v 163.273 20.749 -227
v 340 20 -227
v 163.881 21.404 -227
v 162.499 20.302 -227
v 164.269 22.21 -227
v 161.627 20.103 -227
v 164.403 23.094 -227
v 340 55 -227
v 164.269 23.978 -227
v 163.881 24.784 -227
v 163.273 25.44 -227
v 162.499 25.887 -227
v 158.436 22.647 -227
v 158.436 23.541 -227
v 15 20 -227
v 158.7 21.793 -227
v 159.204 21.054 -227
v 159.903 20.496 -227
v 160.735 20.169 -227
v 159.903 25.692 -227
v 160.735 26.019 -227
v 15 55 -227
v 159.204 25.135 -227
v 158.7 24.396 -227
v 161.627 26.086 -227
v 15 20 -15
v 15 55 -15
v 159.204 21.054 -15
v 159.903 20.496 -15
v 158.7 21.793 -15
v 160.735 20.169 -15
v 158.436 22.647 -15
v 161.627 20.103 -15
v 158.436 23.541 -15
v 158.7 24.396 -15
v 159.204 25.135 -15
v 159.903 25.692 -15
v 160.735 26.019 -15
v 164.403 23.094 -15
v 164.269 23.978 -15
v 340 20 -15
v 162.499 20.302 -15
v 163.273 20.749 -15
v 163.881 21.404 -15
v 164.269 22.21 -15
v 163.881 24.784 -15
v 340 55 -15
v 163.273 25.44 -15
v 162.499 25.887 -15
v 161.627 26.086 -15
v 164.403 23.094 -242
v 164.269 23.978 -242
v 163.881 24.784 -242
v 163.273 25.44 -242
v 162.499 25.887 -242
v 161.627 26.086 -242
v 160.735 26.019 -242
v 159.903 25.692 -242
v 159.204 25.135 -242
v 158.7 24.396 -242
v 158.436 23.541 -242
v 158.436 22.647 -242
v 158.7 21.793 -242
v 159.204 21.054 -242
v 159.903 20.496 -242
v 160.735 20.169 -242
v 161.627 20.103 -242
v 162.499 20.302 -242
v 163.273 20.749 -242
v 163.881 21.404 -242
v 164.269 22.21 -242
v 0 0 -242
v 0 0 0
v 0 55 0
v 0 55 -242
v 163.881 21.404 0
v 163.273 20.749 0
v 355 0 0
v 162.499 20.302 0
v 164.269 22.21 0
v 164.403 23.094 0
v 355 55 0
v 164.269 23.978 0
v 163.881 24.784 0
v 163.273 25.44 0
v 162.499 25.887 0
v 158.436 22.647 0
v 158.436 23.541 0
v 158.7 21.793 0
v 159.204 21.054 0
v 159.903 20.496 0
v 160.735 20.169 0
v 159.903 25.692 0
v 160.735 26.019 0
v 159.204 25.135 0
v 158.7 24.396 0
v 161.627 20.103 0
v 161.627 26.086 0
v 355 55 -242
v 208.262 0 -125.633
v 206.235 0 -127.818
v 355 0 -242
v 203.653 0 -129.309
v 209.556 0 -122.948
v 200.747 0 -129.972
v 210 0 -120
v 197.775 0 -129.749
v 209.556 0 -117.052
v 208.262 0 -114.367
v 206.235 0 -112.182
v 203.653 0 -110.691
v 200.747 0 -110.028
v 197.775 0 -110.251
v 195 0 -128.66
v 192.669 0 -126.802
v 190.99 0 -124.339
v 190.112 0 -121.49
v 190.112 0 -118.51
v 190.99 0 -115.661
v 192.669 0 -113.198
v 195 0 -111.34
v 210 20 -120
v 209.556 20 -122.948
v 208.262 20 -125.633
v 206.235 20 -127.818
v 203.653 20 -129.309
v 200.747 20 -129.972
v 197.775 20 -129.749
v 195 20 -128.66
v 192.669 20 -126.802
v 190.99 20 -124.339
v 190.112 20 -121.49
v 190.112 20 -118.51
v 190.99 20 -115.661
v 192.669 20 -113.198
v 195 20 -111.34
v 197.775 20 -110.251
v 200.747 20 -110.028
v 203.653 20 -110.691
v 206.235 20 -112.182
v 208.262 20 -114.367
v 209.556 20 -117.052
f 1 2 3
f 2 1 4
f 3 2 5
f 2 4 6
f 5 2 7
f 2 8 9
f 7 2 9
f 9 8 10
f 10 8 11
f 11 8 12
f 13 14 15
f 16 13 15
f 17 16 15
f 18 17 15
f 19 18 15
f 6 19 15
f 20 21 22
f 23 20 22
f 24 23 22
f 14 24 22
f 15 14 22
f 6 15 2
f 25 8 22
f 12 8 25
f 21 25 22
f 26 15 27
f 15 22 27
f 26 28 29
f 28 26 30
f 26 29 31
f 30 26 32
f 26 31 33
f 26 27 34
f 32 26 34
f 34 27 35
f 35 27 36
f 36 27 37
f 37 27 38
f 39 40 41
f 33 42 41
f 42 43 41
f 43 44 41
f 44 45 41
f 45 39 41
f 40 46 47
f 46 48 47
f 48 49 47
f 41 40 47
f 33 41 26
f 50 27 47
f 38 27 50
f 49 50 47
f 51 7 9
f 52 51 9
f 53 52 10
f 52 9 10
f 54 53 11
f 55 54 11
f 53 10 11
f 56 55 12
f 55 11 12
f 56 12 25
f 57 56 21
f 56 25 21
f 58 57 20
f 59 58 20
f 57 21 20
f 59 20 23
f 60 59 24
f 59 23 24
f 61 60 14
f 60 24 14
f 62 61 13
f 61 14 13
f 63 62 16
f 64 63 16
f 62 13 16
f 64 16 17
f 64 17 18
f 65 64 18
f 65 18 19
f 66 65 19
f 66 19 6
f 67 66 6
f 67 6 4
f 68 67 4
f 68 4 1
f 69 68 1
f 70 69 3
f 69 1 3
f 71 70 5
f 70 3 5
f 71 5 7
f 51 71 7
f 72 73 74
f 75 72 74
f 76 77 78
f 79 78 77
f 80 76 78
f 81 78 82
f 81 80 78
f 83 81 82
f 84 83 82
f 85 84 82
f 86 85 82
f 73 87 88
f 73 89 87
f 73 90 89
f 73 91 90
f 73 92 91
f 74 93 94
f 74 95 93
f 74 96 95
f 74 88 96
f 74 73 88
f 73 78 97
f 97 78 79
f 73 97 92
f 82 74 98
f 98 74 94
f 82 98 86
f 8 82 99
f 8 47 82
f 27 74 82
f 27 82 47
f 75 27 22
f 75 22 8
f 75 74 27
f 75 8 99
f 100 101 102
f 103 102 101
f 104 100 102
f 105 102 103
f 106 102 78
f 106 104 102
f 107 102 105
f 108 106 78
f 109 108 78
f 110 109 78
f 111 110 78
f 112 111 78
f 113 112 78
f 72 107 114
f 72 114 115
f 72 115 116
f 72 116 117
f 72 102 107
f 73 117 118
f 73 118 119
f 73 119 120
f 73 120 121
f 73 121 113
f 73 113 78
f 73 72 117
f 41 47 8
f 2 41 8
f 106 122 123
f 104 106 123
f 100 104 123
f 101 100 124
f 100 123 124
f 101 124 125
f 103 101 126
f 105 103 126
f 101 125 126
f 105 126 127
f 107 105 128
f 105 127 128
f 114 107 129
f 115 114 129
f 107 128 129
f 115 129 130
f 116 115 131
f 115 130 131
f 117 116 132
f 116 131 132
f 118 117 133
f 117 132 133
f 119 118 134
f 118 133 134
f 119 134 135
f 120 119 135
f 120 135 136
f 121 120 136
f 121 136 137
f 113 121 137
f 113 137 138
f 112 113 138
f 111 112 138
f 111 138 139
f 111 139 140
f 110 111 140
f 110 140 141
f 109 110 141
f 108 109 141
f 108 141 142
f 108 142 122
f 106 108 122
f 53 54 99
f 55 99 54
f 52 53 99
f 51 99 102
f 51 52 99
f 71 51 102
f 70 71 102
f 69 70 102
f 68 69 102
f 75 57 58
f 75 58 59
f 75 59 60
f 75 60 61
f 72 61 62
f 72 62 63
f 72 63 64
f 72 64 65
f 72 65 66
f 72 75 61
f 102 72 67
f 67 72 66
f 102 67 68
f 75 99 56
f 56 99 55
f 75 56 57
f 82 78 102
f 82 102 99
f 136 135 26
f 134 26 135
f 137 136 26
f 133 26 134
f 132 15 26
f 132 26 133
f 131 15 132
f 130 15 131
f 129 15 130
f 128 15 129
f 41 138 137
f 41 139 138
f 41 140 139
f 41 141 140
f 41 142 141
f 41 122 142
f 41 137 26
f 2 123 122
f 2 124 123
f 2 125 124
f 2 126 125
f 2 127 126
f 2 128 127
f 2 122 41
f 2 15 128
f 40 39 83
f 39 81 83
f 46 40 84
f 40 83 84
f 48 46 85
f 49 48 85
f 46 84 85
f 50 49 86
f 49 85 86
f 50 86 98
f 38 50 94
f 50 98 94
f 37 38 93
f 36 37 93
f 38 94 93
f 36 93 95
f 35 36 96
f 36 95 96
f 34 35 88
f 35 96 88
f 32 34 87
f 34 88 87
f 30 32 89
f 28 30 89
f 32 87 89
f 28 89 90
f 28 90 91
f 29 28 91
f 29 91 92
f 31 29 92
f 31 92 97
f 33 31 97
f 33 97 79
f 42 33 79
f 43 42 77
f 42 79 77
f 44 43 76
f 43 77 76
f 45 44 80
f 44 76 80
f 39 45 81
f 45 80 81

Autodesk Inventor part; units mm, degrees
ref_plane "YZ Plane" through (0, 0, 0) normal (1, 0, 0) x (0, 1, 0)
ref_plane "XZ Plane" through (0, 0, 0) normal (0, 1, 0) x (-1, 0, 0)
ref_plane "XY Plane" through (0, 0, 0) normal (0, 0, 1) x (1, 0, 0)
sketch "Sketch1" plane through (0, 0, 0) normal (1, 0, 0) x (0, 1, 0)
  line L0 (0, 0) -> (55, 0)
  line L1 (55, 0) -> (55, -242)
  line L2 (55, -242) -> (0, -242)
  line L3 (0, -242) -> (0, 0)
  dimension "d0" = 55
  dimension "d1" = 242
extrude "Extrusion1" add sketch "Sketch1" along normal blind 355
sketch "Sketch3" plane through (0, 55, 0) normal (0, 1, 0) x (1, 0, 0)
  circle A0 centre (200, 120) radius 10
  point P0 (0, 0)
  point P1 (0, 0)
  dimension "d8" = 20
extrude "Extrusion3" cut sketch "Sketch3" against normal through all
sketch "Sketch4" plane through (0, 55, 0) normal (0, 1, 0) x (1, 0, 0)
  line L0 (15, 15) -> (340, 15)
  line L1 (340, 15) -> (340, 227)
  line L2 (340, 227) -> (15, 227)
  line L3 (15, 227) -> (15, 15)
  line L4 (355, 242) -> (355, 0)
  line L5 (0, 242) -> (355, 242)
  point P0 (0, 0)
  point P1 (0, 0)
  dimension "d11" = 15
  dimension "d12" = 15
extrude "Extrusion4" cut sketch "Sketch4" against normal blind 35
sketch "Sketch5" plane through (0, 0, 0) normal (0, 0, 1) x (1, 0, 0)
  circle A0 centre (161.4027, 23.0942) radius 3
  line L0 (0, 55) -> (0, 0) projected
  line L1 (355, 55) -> (355, 0) projected
  line L2 (0, 0) -> (355, 0) projected
  dimension "d15" = 6
  dimension "d18" = 161.4027
  dimension "d19" = 355
  dimension "d20" = 23.0942
extrude "Extrusion5" cut sketch "Sketch5" against normal through all
ref_plane "Work Plane1" through (0, 0, -121) normal (0, 0, -1) x (-1, 0, 0)
properties part number "basefresh" material "Wood (Cherry)"
